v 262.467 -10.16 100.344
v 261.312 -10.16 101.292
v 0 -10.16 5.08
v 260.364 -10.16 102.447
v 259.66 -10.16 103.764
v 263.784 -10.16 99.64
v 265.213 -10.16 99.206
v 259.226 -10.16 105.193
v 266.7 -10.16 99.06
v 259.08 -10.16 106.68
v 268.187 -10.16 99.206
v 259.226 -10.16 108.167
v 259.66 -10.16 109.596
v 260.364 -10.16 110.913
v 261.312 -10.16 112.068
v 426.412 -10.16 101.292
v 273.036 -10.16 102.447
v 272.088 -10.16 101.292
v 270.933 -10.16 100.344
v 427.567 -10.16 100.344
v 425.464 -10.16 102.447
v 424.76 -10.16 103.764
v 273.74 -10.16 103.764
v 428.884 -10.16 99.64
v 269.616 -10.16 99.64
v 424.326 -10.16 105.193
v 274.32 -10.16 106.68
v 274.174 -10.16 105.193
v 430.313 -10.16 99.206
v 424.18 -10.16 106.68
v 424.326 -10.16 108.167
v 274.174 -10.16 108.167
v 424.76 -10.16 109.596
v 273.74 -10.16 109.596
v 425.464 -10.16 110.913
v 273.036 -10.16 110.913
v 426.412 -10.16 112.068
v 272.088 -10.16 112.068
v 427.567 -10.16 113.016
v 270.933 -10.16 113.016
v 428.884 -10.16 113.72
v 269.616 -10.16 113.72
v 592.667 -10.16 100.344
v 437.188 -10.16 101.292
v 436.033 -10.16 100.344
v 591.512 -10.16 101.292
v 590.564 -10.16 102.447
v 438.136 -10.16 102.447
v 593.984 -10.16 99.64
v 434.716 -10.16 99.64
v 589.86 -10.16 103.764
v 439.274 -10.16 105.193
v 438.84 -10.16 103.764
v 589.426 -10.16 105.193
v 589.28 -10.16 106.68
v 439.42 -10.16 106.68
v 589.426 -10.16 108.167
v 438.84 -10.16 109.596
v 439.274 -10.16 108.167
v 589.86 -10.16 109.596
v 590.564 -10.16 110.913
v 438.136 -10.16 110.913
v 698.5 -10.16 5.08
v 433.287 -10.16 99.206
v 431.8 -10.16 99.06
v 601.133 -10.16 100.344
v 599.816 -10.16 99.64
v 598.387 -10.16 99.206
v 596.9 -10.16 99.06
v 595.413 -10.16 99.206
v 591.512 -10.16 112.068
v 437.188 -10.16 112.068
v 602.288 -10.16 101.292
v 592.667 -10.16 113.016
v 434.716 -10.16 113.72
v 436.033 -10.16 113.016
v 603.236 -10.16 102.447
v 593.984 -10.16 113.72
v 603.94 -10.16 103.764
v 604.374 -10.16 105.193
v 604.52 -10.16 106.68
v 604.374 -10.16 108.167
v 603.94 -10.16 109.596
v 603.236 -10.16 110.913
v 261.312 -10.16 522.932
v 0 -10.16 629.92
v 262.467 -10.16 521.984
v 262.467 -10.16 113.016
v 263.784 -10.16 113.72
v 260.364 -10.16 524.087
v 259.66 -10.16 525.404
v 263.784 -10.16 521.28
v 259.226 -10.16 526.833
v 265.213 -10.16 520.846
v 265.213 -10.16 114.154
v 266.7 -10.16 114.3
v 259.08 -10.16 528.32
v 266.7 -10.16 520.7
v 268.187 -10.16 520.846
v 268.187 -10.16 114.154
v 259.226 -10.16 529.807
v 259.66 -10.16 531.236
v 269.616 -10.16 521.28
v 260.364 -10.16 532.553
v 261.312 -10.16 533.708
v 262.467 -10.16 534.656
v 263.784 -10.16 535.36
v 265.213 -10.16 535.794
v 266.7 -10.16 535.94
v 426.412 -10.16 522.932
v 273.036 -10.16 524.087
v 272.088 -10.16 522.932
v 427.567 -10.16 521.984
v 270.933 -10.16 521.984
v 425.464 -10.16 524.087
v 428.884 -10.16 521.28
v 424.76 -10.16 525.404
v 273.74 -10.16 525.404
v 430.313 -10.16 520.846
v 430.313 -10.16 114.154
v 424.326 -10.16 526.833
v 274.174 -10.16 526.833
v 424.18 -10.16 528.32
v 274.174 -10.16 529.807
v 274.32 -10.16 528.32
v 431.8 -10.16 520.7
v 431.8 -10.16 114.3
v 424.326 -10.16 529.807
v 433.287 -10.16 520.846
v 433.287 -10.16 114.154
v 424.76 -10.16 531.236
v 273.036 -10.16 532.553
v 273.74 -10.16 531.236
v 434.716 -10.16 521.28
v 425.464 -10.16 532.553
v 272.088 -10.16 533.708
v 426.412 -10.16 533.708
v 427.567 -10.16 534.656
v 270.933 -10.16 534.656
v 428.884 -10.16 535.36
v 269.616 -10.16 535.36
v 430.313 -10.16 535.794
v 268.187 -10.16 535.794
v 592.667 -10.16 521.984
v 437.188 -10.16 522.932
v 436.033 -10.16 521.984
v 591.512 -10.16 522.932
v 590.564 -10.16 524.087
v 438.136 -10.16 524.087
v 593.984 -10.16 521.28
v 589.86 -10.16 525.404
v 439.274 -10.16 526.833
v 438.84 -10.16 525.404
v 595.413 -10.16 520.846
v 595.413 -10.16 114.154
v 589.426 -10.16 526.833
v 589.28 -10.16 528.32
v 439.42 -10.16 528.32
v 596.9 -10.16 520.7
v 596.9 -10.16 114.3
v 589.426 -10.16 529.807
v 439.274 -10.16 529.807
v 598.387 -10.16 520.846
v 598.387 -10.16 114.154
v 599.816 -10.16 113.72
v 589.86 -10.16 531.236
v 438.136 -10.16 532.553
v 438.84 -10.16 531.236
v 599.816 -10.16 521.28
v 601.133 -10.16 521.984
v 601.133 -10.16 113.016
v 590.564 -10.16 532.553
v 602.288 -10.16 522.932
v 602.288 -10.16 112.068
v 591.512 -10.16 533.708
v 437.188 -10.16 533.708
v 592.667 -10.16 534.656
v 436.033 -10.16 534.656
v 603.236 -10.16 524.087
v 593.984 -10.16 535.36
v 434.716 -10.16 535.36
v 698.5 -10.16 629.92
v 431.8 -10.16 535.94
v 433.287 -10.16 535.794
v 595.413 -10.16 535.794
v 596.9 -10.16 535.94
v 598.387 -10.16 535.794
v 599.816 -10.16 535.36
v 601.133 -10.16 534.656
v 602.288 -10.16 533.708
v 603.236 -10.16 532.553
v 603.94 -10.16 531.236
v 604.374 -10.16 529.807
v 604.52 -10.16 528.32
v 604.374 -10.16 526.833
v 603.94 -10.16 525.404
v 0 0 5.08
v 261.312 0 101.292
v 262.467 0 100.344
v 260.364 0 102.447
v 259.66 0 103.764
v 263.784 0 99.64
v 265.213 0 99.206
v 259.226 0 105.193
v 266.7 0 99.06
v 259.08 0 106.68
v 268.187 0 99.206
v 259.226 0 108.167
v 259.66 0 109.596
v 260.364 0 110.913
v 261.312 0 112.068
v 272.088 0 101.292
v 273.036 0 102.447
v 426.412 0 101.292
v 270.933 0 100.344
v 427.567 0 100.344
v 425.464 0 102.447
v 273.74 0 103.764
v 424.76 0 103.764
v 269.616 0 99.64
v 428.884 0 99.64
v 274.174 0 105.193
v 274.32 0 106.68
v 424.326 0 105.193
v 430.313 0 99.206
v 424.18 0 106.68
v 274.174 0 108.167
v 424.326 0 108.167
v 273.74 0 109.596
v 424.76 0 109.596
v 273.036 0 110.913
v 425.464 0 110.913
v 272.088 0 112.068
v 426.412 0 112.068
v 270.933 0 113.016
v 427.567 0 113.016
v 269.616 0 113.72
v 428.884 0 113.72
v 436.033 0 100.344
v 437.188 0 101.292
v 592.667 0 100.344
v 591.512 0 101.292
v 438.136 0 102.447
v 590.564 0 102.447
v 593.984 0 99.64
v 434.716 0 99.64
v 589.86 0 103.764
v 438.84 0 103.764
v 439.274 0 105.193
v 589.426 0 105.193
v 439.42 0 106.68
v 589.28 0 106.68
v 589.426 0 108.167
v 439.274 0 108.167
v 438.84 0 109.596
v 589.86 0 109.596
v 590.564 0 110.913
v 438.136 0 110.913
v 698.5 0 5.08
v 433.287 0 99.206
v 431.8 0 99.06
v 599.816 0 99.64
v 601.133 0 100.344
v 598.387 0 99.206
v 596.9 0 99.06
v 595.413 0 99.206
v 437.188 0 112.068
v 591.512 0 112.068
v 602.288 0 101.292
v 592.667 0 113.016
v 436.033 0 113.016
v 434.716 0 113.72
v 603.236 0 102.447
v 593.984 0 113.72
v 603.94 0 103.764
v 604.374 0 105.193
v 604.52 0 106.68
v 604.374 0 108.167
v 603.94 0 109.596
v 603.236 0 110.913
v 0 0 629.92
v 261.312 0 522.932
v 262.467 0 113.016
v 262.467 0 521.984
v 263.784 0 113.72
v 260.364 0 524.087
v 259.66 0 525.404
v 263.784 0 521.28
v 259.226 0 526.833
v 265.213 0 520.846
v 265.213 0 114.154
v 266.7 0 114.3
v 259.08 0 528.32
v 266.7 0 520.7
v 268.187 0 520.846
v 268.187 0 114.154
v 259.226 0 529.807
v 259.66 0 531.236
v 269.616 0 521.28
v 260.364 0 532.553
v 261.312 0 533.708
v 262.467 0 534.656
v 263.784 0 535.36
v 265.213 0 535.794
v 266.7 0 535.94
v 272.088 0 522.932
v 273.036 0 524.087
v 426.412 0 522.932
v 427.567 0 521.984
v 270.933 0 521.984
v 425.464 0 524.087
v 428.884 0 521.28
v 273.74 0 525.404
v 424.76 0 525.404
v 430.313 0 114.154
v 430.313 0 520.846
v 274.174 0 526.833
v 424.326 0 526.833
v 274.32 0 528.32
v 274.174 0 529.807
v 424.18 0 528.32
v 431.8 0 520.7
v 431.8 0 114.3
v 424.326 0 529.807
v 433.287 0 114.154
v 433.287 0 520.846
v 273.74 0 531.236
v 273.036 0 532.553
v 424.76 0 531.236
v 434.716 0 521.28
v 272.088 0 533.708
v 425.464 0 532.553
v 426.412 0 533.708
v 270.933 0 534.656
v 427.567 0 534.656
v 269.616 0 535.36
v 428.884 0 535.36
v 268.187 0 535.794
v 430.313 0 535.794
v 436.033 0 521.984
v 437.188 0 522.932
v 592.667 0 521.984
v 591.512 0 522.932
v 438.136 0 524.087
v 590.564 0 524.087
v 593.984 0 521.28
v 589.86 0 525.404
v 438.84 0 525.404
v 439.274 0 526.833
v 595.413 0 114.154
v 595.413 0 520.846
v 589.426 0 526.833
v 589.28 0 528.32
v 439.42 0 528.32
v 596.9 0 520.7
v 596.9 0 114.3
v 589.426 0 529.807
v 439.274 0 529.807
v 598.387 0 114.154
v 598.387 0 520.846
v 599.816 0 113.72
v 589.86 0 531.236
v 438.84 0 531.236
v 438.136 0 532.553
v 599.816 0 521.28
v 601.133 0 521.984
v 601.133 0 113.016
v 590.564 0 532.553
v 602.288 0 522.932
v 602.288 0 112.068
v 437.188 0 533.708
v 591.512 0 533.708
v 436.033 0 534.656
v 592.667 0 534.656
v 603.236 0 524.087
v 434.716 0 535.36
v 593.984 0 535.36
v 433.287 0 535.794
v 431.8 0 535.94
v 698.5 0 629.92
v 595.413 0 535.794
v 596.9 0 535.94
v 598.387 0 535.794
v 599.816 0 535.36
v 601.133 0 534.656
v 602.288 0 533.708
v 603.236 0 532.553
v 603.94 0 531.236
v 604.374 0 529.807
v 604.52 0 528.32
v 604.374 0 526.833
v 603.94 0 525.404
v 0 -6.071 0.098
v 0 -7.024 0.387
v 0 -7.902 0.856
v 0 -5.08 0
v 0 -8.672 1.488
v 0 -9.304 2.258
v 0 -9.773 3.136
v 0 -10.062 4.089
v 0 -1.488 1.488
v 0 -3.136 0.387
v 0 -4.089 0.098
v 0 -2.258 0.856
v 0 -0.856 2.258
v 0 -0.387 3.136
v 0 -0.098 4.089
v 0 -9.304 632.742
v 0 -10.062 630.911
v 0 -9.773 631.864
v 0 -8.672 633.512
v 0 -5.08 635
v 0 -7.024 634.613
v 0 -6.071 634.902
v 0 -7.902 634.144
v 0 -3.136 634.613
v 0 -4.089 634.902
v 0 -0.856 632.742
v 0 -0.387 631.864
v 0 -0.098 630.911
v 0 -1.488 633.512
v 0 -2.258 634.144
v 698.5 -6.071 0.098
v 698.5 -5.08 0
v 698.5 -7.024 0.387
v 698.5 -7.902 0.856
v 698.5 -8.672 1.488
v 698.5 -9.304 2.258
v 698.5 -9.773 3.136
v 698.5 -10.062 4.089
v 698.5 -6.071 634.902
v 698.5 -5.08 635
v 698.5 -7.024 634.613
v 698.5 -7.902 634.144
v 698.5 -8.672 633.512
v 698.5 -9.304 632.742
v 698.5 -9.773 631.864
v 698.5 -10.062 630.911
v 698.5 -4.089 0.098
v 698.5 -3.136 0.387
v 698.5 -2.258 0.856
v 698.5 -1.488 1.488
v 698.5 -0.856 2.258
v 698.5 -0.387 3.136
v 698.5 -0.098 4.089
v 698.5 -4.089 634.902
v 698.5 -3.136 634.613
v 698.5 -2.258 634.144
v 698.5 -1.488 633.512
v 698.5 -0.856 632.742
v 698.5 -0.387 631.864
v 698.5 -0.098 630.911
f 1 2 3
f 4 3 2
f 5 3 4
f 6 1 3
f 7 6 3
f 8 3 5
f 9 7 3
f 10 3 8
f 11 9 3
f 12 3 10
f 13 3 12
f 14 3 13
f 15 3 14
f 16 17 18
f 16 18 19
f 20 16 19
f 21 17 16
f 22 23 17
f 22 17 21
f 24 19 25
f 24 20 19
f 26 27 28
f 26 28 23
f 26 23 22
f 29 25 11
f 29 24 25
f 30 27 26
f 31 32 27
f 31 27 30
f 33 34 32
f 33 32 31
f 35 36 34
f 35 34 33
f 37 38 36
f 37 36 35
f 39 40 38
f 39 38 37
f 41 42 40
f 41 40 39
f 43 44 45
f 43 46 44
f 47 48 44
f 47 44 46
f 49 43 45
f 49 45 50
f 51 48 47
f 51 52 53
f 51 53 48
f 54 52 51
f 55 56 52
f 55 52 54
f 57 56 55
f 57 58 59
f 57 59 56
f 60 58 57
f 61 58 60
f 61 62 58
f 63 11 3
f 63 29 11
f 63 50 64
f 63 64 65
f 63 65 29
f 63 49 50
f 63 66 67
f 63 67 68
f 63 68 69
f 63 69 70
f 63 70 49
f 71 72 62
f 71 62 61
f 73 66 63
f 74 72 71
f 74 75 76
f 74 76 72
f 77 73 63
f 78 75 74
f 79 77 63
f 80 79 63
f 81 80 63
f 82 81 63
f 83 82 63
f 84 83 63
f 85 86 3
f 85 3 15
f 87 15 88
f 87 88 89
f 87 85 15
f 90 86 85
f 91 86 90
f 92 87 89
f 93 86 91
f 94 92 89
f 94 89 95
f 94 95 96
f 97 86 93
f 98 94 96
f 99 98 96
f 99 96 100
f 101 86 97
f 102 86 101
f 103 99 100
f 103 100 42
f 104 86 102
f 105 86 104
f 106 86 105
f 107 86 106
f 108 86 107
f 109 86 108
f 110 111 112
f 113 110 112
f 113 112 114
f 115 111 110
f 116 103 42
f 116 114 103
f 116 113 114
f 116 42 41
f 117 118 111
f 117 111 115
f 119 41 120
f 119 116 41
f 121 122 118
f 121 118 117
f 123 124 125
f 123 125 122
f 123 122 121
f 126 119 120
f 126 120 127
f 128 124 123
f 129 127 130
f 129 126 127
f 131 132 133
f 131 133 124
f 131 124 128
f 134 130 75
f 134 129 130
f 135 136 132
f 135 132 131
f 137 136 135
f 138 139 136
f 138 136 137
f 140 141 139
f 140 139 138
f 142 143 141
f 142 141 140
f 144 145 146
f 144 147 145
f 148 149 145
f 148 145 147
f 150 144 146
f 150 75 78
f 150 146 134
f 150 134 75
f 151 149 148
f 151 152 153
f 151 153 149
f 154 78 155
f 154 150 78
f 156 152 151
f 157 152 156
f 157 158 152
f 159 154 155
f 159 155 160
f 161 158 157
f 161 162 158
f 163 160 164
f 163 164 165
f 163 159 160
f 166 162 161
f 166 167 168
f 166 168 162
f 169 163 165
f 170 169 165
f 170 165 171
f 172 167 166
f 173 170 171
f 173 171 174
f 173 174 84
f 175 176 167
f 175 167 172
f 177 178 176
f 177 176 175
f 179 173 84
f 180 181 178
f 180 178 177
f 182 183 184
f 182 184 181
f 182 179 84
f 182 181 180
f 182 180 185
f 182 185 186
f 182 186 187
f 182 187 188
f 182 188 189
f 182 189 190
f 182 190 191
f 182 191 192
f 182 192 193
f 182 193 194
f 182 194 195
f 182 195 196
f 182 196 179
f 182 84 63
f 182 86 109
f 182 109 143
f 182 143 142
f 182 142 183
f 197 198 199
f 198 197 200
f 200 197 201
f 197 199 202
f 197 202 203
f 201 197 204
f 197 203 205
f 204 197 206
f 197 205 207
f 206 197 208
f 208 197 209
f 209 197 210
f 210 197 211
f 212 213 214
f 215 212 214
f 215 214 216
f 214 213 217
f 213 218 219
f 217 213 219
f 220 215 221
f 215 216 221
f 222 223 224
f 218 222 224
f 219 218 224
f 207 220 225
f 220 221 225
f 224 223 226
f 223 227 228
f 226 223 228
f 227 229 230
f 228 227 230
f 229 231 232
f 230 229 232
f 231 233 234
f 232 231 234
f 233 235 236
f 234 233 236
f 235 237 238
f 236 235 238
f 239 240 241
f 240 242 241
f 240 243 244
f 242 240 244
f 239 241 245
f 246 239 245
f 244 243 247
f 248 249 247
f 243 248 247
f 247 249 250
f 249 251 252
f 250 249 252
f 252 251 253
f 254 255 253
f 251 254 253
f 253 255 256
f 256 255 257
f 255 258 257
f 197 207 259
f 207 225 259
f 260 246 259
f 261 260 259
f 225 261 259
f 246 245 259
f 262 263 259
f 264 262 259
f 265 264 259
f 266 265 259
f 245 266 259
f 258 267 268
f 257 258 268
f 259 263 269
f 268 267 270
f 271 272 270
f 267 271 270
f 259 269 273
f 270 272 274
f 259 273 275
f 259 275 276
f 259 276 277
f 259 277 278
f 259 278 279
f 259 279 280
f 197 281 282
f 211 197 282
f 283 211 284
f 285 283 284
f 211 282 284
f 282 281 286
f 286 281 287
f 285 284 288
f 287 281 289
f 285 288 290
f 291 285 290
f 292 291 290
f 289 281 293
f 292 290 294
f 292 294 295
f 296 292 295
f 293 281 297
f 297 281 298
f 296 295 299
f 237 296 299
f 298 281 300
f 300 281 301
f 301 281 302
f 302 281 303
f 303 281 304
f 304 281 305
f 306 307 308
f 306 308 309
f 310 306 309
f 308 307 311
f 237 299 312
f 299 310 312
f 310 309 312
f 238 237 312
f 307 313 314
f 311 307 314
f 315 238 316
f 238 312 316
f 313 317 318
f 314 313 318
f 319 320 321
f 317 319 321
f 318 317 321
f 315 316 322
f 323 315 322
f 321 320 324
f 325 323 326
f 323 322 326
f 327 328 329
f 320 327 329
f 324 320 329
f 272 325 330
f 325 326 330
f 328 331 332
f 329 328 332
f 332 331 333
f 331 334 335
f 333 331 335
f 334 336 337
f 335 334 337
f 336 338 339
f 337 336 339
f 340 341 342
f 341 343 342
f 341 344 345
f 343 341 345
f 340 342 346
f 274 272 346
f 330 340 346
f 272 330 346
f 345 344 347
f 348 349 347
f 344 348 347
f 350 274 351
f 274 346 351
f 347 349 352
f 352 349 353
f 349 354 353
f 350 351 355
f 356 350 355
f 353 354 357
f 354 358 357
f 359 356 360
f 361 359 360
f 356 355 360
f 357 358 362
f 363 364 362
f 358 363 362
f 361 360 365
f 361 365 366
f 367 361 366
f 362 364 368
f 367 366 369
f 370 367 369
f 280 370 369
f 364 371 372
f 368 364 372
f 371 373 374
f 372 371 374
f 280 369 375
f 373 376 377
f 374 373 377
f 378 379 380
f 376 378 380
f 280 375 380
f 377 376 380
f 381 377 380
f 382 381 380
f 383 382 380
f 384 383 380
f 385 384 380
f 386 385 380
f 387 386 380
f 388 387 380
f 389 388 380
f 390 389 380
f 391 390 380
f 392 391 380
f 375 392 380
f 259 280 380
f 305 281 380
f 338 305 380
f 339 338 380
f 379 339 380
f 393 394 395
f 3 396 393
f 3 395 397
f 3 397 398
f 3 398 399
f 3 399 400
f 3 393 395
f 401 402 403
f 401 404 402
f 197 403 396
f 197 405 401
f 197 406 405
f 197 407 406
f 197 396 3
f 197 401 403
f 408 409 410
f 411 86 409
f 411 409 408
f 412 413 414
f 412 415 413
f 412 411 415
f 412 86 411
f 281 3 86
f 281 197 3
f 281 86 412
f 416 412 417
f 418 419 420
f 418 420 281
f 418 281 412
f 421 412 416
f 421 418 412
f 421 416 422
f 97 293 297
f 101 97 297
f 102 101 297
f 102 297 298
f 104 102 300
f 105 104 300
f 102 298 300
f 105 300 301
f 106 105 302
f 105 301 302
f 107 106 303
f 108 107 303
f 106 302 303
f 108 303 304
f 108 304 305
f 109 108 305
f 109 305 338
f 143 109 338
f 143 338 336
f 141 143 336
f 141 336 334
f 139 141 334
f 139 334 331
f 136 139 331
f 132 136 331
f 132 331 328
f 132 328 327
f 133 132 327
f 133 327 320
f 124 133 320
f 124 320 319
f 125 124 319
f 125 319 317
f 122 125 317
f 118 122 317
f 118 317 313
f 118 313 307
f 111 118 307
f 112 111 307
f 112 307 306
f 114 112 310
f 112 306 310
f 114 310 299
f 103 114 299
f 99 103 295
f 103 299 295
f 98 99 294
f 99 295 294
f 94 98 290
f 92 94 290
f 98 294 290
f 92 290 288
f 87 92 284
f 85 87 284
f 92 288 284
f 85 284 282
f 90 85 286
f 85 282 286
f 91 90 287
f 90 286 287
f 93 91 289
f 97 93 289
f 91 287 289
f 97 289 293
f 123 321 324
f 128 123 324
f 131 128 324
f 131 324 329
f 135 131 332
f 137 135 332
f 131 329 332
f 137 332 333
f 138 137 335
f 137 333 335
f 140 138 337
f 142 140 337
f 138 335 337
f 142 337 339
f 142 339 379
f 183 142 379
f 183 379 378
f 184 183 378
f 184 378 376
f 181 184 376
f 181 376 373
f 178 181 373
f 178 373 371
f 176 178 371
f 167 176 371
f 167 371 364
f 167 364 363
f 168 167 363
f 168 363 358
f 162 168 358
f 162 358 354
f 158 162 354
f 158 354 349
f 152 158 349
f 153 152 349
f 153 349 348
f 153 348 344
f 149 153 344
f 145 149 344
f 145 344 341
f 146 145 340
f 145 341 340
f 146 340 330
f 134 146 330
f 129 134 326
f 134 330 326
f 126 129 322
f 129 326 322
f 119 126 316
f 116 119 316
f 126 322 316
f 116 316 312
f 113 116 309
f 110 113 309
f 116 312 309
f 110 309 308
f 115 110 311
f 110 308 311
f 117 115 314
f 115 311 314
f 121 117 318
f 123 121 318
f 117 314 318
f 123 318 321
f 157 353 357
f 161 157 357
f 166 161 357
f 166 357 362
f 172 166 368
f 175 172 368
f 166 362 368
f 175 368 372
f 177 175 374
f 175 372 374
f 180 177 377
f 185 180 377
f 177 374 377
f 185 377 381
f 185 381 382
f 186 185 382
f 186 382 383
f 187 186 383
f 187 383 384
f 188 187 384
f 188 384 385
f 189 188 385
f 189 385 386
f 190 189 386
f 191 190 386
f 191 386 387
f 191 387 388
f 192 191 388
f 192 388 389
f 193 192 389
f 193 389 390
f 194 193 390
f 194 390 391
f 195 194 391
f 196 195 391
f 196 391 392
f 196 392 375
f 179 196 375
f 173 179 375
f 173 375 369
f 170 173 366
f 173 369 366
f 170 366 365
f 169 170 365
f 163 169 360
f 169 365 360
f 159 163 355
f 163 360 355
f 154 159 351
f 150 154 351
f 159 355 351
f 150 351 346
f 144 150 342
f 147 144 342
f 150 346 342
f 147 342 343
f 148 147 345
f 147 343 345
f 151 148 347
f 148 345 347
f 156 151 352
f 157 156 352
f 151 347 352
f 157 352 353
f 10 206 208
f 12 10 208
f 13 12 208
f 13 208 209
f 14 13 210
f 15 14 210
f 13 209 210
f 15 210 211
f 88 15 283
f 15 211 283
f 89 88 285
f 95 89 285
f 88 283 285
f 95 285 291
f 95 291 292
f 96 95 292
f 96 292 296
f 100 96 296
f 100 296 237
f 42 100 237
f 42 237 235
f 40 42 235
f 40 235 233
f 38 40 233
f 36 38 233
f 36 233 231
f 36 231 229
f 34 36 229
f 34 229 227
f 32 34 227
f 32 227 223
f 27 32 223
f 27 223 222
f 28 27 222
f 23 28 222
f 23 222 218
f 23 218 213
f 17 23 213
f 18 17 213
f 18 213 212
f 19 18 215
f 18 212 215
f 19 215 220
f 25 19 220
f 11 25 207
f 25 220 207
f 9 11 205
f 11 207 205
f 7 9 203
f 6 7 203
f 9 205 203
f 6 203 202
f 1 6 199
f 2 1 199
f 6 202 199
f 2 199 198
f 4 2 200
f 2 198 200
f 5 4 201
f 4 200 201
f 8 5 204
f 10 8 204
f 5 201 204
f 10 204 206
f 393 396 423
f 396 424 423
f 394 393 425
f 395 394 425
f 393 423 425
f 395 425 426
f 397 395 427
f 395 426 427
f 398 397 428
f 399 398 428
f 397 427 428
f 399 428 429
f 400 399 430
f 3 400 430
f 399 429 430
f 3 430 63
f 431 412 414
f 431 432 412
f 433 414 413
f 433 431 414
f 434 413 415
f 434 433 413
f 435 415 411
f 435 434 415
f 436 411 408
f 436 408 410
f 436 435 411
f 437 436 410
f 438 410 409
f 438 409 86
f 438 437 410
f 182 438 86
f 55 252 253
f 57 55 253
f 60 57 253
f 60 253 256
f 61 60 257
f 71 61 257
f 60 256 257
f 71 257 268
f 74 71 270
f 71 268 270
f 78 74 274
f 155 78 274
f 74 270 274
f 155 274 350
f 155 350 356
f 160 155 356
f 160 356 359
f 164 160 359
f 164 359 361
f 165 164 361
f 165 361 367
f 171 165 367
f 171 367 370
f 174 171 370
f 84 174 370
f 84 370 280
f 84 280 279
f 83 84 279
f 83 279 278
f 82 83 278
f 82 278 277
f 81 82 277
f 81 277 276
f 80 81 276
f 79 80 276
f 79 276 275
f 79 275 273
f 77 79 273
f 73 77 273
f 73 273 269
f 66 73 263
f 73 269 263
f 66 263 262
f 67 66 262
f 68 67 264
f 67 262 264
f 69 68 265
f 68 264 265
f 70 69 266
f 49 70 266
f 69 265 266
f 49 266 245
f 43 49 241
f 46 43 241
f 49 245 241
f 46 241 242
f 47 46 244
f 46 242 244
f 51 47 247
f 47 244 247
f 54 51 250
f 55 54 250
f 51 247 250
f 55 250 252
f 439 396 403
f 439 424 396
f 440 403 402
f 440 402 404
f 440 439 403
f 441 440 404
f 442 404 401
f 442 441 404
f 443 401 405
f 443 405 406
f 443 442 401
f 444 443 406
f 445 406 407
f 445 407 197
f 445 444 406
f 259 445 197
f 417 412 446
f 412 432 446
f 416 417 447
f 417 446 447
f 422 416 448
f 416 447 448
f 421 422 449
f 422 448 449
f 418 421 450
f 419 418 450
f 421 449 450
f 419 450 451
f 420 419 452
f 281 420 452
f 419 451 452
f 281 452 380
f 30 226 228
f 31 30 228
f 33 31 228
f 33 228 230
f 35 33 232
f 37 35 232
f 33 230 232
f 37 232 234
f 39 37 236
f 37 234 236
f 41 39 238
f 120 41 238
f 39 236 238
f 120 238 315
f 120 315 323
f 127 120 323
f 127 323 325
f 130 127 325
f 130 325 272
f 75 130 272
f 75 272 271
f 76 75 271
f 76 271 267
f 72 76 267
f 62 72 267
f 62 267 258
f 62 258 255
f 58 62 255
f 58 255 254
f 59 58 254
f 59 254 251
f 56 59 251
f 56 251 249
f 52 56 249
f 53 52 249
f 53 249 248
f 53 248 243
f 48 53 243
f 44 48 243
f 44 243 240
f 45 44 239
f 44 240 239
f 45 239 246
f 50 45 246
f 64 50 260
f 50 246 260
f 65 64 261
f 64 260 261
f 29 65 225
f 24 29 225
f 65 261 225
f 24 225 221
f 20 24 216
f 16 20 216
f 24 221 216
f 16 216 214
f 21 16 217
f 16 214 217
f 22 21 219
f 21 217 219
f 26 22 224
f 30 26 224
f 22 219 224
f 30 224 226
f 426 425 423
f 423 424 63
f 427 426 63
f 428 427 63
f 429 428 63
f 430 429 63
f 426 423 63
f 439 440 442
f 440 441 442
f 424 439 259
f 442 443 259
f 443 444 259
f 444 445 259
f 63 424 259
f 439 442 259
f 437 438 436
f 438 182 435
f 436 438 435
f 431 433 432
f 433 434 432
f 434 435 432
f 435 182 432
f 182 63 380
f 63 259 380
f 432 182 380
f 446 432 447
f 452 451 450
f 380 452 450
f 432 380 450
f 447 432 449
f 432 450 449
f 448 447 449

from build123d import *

# Parameters (mm, degrees)
F0_W     = 698.5
F0_H     = 635
F1_DEPTH = 10.16
F3_R     = 5.07999
F5_D     = 15.24


# Not quite as in the source:
# - a fillet or chamfer is up to 0.001 mm smaller than in the source, because OpenCascade refuses the exact size


with BuildPart() as f1:
    # F0 (on Front) → F1 (new body)
    with BuildSketch(Plane.XZ):
        with Locations((349.25, 317.5)):
            Rectangle(F0_W, F0_H)
    extrude(amount=F1_DEPTH)

    # F3 (radius 5.08 in the source; OpenCascade refuses exactly that, so slightly less here)
    f3_edges = [f1.edges().sort_by_distance(p)[0] for p in [
        (349.25, -10.16, 635),
        (349.25, 0, 635),
        (349.25, -10.16, 0),
        (349.25, 0, 0),
    ]]
    fillet(f3_edges, radius=F3_R)

    # F5 (through all)
    with Locations(Plane.XZ.offset(10.16)):
        with Locations((431.8, 528.32), (266.7, 528.32), (596.9, 528.32), (596.9, 106.68), (431.8, 106.68), (266.7, 106.68)):
            Hole(F5_D / 2)


solid = f1.part
